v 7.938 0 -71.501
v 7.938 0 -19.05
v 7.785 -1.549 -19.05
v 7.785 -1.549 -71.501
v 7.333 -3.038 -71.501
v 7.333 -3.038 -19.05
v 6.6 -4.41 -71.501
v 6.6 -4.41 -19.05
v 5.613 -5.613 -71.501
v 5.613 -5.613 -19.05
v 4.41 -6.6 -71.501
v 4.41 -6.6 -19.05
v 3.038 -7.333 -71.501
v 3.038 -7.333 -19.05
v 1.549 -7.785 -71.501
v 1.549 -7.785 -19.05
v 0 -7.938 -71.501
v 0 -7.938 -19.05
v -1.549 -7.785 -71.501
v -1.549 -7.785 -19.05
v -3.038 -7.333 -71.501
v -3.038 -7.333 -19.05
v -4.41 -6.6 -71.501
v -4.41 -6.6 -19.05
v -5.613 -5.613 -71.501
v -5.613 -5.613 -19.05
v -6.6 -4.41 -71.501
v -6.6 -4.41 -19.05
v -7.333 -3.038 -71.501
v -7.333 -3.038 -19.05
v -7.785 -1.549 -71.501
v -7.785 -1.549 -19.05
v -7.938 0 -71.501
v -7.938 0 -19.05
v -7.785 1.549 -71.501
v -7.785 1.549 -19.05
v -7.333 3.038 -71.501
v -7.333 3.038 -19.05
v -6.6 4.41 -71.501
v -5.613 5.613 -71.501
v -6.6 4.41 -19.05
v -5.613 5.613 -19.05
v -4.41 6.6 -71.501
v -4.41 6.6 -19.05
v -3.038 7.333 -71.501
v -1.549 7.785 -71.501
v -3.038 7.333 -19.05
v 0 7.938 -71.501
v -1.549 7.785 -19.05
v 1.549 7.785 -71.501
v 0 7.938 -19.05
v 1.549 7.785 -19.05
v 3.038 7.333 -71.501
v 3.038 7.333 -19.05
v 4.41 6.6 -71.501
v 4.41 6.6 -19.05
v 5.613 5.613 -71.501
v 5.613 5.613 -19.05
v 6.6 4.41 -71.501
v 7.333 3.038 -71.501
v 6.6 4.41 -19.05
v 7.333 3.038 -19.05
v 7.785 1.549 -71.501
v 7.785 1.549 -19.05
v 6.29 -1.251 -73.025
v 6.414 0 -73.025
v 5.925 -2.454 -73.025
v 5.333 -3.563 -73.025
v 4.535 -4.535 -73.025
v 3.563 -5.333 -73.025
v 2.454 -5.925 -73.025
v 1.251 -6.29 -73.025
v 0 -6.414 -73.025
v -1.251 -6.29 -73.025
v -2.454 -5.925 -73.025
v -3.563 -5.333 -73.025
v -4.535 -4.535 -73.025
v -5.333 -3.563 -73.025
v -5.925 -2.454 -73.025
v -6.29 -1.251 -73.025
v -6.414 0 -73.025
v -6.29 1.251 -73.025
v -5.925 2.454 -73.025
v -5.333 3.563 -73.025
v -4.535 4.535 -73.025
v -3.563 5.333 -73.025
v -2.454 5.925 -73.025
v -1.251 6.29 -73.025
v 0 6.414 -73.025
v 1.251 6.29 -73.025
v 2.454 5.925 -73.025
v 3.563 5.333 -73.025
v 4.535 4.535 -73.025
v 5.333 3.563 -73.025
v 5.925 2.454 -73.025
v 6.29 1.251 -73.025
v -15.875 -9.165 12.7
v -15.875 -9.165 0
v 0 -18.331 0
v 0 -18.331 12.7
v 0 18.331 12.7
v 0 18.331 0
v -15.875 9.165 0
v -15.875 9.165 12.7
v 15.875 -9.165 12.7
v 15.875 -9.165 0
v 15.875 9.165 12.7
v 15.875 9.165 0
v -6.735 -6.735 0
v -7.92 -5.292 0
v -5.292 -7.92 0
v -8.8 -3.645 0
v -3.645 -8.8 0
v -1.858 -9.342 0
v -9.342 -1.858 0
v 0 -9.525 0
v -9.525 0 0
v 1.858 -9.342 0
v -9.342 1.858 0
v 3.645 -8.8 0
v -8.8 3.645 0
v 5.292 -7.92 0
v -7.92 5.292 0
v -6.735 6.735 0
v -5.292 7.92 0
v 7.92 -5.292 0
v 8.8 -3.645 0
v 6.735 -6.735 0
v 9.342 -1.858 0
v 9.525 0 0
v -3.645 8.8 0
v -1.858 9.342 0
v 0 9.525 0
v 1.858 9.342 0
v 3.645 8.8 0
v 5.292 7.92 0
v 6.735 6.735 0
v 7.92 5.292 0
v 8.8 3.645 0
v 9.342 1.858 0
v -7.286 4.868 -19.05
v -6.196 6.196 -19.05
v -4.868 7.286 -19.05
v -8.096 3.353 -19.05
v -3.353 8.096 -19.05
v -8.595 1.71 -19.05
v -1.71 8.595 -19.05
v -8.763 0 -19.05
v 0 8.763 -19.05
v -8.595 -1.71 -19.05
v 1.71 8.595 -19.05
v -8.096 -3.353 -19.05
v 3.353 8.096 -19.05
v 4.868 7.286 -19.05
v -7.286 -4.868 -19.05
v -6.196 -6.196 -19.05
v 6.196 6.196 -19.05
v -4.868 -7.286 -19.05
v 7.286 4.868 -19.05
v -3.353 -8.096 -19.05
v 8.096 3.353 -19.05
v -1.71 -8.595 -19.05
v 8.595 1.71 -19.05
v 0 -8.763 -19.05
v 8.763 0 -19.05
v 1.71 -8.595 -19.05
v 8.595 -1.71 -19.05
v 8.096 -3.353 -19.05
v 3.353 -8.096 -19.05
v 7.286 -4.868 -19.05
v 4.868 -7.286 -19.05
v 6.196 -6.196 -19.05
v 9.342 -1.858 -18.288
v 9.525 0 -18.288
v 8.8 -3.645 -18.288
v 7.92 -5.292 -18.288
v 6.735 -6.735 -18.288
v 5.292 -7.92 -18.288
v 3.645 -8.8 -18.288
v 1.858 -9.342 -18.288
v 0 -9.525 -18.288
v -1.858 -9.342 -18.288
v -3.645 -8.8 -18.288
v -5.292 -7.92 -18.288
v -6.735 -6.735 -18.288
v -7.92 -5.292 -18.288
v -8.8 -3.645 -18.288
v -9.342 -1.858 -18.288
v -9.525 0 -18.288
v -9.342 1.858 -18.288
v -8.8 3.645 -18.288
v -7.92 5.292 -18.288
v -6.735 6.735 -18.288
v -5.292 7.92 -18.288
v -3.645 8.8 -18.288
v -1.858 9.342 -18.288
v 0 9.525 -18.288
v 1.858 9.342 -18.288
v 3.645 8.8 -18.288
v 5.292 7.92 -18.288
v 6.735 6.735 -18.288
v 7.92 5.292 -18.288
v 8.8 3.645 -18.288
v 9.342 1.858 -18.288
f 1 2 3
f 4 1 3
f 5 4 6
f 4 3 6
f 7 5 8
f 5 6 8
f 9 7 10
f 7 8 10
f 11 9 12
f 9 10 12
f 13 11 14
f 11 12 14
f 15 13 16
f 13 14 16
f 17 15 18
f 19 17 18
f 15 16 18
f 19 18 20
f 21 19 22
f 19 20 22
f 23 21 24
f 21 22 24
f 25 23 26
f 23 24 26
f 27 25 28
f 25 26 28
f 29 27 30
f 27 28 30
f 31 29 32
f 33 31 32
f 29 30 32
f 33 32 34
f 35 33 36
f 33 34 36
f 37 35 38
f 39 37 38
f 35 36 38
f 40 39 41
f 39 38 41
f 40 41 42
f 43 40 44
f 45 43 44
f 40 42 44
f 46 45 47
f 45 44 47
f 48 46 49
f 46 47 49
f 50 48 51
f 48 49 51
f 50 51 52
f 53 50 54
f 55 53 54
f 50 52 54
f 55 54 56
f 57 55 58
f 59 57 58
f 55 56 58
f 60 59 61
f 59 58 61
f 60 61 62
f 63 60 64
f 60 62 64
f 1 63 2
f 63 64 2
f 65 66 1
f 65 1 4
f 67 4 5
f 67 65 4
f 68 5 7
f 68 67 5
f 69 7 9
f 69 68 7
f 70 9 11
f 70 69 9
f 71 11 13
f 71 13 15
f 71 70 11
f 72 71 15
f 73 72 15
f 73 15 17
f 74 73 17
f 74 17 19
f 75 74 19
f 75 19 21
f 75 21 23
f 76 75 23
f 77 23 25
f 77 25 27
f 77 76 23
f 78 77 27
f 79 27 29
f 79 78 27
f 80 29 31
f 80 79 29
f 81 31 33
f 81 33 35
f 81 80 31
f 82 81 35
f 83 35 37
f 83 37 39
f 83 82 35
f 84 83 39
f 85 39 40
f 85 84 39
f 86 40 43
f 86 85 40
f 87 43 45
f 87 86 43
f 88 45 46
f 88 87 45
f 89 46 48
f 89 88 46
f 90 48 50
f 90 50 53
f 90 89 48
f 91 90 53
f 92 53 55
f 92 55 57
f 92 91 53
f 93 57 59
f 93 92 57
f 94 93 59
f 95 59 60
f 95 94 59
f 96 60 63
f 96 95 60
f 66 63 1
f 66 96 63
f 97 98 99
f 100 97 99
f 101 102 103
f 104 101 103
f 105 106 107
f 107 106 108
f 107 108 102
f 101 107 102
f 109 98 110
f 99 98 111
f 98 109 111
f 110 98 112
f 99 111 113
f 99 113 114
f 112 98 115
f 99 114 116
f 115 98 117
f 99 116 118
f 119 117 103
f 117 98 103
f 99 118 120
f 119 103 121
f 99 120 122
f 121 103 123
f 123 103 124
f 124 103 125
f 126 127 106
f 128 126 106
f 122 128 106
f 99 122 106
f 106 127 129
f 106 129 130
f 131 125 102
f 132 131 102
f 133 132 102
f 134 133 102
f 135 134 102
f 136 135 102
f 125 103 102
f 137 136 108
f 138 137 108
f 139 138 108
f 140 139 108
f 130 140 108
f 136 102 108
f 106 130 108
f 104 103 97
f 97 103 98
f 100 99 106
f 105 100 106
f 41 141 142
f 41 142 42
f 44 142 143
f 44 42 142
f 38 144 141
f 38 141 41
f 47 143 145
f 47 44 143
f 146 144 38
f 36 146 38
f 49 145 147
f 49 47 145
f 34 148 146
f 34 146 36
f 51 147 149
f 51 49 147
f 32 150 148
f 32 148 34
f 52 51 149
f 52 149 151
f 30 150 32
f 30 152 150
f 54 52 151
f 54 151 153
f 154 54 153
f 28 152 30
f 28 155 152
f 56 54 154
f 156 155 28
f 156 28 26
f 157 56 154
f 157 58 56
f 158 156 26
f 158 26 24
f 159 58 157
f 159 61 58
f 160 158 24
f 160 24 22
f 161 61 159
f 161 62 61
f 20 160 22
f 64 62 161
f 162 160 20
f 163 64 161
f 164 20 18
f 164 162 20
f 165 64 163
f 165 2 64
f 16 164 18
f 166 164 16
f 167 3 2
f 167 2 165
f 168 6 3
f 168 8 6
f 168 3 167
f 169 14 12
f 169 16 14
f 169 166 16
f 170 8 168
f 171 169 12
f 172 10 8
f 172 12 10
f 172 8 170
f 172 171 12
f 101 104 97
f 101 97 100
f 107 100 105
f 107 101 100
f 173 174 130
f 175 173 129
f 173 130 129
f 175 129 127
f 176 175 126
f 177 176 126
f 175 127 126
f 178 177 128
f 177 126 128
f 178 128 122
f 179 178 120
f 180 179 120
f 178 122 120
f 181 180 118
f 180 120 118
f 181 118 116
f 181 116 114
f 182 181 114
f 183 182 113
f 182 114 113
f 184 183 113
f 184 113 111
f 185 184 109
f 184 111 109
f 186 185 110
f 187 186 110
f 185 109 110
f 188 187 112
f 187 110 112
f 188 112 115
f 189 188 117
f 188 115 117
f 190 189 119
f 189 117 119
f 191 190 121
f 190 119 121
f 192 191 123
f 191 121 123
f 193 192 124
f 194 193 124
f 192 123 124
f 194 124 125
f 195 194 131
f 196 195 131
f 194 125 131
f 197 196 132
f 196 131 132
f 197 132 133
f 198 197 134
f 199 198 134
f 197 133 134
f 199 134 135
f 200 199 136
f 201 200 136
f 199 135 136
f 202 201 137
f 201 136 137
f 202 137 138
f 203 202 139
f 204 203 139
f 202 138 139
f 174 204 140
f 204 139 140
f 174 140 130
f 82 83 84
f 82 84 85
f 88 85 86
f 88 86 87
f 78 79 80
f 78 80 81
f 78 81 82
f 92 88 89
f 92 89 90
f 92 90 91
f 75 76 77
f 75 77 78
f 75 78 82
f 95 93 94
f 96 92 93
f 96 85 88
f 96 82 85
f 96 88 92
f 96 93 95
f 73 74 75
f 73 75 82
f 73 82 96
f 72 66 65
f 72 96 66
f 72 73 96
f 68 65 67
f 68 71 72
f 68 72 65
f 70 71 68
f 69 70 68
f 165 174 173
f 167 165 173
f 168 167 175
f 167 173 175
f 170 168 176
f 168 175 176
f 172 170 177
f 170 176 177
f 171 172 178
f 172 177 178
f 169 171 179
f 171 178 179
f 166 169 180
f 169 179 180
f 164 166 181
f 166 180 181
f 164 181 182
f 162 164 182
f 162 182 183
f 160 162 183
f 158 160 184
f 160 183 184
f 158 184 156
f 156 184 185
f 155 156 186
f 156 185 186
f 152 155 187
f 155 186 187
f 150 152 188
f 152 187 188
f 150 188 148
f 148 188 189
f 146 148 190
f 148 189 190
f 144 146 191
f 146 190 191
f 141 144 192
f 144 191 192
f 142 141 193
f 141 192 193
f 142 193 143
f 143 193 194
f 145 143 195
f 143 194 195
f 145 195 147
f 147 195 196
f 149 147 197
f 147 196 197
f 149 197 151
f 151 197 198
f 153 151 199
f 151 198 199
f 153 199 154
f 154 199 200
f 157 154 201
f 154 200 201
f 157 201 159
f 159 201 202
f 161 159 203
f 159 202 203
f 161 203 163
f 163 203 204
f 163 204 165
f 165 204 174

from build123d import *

# Parameters (mm, degrees)
F1_DEPTH = 12.7
F2_R     = 9.525
F3_DEPTH = 19.05
F4_R     = 7.9375
F5_DEPTH = 53.975
F6_SIZE  = 1.524
F7_SIZE  = 0.762


with BuildPart() as f1:
    # F0 (on Top) → F1 (new body)
    with BuildSketch(Plane.XY):
        Polygon((-15.875, 9.165436), (-15.875, -9.165436), (0, -18.330871), (15.875, -9.165436), (15.875, 9.165436), (0, 18.330871), align=None)
    extrude(amount=F1_DEPTH)

    # F2 (on face) → F3 (join)
    with BuildSketch(Plane(origin=(0, 0, 0), x_dir=(1, 0, 0), z_dir=(0, 0, -1))):
        Circle(F2_R)
    extrude(amount=F3_DEPTH)

    # F4 (on face) → F5 (join)
    with BuildSketch(Plane(origin=(0, 0, -19.05), x_dir=(1, 0, 0), z_dir=(0, 0, -1))):
        Circle(F4_R)
    extrude(amount=F5_DEPTH)

    # F6
    f6_edges = [f1.edges().sort_by_distance(p)[0] for p in [
        (-7.9375, 0, -73.025),
    ]]
    chamfer(f6_edges, length=F6_SIZE)

    # F7
    f7_edges = [f1.edges().sort_by_distance(p)[0] for p in [
        (-9.525, 0, -19.05),
    ]]
    chamfer(f7_edges, length=F7_SIZE)


solid = f1.part
